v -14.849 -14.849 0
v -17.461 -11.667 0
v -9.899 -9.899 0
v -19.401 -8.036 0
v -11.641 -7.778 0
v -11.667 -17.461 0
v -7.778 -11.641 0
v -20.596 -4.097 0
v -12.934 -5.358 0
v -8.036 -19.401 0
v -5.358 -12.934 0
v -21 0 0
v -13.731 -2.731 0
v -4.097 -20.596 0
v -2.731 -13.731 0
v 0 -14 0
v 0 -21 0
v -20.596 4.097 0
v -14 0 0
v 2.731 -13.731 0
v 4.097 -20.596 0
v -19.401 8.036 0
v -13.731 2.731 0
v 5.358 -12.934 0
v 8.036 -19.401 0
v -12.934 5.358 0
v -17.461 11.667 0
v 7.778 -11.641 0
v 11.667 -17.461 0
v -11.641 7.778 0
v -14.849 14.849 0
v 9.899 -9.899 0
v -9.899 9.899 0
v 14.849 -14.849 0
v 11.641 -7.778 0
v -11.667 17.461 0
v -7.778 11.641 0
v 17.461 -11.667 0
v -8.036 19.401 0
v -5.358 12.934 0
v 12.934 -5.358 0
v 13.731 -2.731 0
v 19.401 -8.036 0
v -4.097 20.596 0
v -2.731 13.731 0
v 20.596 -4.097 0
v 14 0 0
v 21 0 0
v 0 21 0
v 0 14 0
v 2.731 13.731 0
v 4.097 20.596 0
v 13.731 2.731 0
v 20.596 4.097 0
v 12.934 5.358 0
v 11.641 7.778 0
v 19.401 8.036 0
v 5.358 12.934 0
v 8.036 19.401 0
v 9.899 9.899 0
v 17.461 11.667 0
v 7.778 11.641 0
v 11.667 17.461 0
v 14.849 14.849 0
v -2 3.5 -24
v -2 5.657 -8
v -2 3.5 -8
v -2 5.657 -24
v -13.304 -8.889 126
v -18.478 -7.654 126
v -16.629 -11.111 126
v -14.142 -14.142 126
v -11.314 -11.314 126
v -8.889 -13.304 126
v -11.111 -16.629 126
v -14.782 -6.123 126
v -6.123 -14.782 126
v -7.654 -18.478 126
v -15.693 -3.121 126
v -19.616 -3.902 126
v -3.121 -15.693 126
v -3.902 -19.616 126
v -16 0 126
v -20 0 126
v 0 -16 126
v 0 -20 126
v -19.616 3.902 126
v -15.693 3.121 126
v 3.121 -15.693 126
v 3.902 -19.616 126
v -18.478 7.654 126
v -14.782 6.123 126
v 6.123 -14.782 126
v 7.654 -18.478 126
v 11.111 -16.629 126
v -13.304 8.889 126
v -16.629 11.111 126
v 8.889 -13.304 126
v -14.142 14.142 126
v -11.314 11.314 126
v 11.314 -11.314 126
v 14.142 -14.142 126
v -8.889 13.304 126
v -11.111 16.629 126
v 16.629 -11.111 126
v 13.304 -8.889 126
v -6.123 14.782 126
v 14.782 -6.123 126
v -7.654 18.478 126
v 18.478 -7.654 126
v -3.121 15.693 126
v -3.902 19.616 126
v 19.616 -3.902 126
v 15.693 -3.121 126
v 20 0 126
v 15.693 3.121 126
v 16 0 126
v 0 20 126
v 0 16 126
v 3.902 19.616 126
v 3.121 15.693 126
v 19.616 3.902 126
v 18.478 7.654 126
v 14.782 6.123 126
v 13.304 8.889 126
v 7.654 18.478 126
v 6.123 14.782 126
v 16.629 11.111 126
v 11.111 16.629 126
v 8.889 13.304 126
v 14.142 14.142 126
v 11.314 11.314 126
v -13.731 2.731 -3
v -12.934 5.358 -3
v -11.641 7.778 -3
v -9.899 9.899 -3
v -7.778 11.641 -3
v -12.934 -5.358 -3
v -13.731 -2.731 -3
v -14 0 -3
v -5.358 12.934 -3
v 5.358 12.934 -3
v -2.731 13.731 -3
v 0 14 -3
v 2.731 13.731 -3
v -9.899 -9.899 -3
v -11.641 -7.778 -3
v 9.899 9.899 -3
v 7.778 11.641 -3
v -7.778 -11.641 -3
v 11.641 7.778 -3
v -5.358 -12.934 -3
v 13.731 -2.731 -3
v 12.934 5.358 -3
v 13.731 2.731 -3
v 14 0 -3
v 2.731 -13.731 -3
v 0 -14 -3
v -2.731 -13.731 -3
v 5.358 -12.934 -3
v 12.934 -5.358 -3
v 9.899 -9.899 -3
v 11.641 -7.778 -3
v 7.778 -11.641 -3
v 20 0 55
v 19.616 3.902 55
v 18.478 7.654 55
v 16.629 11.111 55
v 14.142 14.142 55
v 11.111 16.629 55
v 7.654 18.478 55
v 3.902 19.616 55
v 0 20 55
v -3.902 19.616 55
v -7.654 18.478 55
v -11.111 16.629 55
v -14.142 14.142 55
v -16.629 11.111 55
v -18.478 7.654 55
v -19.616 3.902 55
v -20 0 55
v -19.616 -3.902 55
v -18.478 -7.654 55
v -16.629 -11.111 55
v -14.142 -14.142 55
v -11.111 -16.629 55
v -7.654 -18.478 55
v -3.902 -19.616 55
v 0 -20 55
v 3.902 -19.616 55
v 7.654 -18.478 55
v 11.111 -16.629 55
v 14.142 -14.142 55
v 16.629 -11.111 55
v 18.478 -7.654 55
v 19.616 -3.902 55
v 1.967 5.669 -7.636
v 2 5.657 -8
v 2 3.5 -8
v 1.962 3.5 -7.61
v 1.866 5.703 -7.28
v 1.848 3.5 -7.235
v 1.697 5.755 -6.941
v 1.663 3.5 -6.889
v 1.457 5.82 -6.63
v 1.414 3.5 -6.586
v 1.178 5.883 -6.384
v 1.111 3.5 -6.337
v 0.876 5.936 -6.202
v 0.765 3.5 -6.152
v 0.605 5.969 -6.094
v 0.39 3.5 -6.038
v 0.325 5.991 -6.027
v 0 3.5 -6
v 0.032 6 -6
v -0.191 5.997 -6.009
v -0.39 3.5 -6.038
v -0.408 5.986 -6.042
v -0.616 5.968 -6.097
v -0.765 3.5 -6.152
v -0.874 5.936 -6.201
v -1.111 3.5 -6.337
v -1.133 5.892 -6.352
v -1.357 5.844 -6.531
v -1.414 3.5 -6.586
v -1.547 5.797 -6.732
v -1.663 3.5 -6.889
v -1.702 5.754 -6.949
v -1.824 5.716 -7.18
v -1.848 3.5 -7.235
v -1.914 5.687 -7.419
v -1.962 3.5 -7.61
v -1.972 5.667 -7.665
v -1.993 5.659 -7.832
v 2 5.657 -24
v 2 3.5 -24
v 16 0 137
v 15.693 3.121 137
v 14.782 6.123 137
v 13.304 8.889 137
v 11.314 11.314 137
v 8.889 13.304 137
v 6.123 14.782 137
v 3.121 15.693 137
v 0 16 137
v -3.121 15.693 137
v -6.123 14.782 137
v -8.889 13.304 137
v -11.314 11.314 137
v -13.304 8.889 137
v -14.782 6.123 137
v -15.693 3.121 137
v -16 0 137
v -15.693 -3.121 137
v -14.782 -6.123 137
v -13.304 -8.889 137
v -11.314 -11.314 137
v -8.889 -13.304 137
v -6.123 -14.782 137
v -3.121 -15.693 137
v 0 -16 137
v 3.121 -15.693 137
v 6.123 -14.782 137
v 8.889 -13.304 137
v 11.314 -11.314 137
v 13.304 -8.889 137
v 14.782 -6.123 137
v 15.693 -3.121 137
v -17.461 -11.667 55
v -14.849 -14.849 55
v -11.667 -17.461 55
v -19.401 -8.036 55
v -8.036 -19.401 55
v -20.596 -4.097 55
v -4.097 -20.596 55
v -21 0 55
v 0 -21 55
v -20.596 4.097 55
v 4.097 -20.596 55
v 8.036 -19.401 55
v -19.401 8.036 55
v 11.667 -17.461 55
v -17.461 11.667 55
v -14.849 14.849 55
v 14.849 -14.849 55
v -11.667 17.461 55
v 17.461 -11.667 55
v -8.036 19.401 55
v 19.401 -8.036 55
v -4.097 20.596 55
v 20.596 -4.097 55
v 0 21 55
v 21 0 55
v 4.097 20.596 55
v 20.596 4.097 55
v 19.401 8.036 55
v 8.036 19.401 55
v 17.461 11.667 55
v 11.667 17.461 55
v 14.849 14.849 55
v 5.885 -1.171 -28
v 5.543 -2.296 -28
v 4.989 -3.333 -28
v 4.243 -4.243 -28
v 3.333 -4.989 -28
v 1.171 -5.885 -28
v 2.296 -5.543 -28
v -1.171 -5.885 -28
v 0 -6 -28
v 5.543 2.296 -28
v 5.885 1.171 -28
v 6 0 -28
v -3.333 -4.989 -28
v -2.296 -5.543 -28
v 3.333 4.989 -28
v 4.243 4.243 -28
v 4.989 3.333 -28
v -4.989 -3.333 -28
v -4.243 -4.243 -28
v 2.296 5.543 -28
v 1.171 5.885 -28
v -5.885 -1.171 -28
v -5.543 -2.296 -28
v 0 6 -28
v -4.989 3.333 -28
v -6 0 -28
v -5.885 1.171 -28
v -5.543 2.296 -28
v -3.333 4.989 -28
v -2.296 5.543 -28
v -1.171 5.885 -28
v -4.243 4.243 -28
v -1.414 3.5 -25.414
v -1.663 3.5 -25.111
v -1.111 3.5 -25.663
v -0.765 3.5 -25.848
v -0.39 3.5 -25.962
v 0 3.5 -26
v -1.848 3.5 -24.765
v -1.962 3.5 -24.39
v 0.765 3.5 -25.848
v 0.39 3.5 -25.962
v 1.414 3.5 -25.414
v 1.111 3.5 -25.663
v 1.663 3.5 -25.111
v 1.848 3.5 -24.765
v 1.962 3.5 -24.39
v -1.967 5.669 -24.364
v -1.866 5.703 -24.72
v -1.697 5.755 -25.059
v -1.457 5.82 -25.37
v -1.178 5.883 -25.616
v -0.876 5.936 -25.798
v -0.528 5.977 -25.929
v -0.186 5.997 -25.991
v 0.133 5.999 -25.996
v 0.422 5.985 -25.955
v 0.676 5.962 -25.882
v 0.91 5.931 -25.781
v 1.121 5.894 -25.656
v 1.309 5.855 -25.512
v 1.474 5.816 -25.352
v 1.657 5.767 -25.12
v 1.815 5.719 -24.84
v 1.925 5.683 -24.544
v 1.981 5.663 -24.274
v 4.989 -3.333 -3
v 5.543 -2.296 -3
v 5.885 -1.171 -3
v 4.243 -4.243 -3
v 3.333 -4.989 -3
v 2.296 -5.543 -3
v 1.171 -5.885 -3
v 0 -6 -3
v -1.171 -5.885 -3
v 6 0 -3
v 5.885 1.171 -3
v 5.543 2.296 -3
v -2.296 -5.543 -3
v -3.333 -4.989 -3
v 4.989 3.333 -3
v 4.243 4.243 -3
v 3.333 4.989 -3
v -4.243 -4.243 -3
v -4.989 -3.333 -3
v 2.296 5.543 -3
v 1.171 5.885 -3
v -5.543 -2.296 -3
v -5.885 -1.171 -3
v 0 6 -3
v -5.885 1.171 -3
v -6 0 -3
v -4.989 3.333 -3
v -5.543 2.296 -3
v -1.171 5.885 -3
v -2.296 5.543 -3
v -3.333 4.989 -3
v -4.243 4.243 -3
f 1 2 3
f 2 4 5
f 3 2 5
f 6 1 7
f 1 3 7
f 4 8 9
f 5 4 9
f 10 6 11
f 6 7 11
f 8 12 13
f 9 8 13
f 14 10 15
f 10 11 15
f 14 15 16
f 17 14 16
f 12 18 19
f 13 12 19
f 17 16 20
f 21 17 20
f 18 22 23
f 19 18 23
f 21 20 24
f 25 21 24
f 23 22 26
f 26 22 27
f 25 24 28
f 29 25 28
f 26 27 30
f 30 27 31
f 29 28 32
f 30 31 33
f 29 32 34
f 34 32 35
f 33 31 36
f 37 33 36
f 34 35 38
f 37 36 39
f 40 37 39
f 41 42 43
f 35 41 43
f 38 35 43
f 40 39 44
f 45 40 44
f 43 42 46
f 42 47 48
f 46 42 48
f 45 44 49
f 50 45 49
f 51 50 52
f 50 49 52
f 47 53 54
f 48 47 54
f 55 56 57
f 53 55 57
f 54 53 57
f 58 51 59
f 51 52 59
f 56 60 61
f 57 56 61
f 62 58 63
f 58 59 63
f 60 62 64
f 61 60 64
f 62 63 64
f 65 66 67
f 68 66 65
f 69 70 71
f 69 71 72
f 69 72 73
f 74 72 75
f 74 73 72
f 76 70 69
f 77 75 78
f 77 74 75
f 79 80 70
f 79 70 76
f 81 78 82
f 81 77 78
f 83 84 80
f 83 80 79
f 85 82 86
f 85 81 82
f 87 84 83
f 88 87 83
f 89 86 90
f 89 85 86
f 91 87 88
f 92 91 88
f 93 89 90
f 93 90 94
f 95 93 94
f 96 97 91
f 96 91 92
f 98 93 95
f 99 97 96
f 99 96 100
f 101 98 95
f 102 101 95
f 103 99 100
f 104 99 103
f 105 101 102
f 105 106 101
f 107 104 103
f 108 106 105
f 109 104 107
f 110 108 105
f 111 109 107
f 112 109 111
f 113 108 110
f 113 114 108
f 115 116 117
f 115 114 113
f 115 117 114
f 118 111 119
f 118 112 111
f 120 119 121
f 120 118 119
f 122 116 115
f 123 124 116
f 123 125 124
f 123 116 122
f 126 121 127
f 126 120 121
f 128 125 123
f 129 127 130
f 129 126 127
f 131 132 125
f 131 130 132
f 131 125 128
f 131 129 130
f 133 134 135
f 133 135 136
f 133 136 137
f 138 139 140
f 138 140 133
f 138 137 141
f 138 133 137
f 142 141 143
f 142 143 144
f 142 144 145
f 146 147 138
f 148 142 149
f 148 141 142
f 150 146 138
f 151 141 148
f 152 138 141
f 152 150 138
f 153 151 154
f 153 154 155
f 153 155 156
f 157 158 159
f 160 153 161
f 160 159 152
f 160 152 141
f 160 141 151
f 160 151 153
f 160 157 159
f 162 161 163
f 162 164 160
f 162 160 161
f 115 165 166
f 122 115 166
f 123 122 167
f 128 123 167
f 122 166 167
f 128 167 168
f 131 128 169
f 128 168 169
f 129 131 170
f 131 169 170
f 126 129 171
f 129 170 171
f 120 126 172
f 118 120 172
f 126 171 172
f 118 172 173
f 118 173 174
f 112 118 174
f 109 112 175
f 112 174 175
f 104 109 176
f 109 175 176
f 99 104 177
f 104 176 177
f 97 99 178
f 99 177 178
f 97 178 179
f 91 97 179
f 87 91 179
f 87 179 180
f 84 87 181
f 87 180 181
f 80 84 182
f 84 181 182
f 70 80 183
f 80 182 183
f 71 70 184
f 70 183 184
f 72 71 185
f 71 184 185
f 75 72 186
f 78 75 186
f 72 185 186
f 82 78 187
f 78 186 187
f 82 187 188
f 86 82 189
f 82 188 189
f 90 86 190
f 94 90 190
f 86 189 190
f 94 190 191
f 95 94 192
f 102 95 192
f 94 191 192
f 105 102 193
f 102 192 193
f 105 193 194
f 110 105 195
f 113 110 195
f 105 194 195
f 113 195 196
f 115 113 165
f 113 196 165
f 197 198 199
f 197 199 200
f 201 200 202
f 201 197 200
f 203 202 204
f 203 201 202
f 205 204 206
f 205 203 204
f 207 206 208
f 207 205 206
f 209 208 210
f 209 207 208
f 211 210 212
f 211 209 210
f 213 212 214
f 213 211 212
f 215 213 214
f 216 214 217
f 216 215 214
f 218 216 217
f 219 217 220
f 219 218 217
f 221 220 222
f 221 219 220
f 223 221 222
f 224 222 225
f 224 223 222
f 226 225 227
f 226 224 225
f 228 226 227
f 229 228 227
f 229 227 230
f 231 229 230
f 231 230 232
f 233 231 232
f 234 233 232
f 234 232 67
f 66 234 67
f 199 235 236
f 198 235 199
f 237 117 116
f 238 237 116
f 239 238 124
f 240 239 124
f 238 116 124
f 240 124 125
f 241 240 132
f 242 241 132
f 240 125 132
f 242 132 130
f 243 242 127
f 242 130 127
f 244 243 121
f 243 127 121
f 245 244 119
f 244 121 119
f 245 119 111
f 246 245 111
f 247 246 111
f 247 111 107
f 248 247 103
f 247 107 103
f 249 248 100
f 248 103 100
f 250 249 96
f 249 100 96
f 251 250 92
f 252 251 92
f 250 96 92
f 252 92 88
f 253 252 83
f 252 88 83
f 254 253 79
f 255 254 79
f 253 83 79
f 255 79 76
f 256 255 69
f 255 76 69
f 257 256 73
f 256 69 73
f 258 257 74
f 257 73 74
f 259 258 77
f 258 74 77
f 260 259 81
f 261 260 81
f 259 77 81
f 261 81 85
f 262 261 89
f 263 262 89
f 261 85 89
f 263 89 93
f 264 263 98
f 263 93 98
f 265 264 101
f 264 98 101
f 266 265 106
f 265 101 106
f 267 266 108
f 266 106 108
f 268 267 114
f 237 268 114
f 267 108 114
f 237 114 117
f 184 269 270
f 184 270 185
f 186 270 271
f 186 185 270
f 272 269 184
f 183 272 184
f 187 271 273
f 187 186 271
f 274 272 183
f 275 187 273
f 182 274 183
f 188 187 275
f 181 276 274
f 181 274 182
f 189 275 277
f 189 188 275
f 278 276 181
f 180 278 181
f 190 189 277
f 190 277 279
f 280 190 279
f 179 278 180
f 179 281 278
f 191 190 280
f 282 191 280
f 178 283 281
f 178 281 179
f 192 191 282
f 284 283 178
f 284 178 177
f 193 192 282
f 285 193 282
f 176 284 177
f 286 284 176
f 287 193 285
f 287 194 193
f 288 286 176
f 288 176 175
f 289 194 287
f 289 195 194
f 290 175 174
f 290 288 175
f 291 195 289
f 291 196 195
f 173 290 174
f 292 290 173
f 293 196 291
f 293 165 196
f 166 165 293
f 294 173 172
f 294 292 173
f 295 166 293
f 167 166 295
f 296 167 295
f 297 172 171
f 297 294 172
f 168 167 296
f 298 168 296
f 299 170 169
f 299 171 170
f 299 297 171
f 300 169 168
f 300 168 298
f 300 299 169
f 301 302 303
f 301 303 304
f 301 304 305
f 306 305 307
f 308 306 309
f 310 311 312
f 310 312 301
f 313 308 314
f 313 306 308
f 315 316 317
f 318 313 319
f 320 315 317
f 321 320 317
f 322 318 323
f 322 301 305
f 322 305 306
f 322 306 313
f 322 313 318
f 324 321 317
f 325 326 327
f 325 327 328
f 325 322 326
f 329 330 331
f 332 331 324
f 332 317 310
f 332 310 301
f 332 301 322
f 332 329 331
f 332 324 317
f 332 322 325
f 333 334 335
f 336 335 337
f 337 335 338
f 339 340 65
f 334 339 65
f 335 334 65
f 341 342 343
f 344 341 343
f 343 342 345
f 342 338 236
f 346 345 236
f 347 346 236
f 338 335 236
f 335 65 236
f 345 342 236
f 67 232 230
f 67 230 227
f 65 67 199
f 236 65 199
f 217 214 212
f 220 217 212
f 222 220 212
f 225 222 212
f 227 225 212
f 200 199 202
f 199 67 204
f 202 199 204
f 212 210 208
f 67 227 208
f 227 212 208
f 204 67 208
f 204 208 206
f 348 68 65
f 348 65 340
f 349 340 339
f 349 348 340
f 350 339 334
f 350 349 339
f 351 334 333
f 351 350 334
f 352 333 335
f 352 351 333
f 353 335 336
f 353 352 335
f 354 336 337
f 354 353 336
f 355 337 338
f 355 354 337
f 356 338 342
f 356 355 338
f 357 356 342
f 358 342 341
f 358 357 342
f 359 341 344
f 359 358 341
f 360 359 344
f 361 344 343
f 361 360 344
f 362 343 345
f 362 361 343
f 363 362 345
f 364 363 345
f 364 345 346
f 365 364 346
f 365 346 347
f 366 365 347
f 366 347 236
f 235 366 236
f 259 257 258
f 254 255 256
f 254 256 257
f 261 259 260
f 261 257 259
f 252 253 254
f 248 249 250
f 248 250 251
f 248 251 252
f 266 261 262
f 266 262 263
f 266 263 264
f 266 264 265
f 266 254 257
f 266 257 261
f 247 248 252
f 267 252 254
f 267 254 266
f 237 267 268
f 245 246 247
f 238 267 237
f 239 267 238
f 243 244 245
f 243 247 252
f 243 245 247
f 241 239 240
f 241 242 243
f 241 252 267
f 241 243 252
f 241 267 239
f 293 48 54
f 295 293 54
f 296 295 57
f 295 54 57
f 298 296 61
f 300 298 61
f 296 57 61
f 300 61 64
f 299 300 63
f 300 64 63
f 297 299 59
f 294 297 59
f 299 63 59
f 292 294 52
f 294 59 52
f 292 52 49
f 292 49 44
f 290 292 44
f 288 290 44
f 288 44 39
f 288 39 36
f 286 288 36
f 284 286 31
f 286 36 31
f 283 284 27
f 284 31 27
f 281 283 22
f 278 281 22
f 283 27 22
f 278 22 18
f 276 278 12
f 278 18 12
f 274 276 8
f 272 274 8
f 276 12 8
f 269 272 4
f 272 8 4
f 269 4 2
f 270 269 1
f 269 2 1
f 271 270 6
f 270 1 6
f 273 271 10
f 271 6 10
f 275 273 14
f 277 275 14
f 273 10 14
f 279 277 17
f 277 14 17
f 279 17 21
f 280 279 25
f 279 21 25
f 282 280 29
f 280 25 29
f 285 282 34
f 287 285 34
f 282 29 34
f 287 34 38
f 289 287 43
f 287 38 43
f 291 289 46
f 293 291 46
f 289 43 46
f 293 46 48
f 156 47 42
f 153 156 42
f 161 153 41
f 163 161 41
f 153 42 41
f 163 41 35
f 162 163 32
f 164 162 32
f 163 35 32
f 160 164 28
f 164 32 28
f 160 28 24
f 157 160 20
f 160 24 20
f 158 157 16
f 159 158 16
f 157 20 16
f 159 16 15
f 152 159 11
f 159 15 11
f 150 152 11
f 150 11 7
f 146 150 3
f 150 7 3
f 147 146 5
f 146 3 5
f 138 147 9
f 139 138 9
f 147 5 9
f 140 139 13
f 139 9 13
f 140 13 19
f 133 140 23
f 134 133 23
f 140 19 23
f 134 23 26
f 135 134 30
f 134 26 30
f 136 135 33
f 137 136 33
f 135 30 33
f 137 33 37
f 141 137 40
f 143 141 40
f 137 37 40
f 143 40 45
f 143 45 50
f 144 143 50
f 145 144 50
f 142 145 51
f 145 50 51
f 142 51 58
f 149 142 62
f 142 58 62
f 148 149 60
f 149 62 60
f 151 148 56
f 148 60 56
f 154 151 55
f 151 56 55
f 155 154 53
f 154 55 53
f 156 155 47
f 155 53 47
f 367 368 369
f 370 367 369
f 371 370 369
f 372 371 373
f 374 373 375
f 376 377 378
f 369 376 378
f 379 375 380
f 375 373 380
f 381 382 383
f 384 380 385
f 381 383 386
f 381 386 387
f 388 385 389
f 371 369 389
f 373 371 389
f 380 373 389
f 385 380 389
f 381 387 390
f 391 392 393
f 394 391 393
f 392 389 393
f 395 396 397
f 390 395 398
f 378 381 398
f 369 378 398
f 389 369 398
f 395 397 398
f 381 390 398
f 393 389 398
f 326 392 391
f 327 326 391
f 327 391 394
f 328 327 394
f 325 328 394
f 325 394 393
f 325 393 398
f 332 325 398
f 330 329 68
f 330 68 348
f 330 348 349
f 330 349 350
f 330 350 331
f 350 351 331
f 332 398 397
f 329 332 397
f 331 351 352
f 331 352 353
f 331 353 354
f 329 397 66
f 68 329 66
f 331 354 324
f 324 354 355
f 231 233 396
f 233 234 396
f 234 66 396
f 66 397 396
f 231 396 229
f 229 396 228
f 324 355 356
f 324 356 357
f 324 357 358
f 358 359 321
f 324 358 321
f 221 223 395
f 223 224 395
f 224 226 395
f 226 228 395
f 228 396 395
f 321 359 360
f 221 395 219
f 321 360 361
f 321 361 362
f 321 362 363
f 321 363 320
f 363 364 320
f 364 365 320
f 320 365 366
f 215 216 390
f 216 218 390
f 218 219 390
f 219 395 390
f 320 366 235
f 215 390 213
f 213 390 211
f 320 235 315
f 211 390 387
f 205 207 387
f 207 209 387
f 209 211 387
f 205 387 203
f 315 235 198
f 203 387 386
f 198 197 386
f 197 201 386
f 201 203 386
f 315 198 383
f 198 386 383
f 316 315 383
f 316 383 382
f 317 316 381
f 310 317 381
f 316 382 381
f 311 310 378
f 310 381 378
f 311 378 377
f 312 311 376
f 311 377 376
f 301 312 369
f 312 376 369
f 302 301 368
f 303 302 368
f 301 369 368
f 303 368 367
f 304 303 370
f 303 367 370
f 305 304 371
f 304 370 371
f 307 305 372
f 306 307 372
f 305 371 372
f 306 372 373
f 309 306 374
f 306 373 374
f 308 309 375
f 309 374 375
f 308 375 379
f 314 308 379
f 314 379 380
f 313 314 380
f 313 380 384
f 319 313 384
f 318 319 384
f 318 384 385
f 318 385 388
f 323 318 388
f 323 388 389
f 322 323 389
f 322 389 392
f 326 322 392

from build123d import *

# Parameters (mm, degrees)
SKETCH_1_R          = 21
EXTRUDE_323_DEPTH   = 55
SKETCH_2_R          = 20
EXTRUDE_422_DEPTH   = 71
SKETCH_3_R          = 16
EXTRUDE_545_DEPTH   = 11
SKETCH_5_R          = 14
EXTRUDE_640_DEPTH   = 3
SKETCH_4_R          = 6
EXTRUDE_761_DEPTH   = 25
CUT_EXTRUDE_1_DEPTH = 2.5


with BuildPart() as part:
    # 草图1 → Extrude 323 (new body)
    with BuildSketch(Plane.XY):
        Circle(SKETCH_1_R)
    extrude(amount=EXTRUDE_323_DEPTH)

    # 草图2 → Extrude 422 (add)
    with BuildSketch(Plane.XY.offset(55)):
        Circle(SKETCH_2_R)
    extrude(amount=EXTRUDE_422_DEPTH)

    # 草图3 → Extrude 545 (add)
    with BuildSketch(Plane.XY.offset(126)):
        Circle(SKETCH_3_R)
    extrude(amount=EXTRUDE_545_DEPTH)

    # 草图5 → Extrude 640 (add)
    with BuildSketch(Plane(origin=(0, 0, 0), x_dir=(-1, 0, 0), z_dir=(0, 0, -1))):
        with Locations(Location((0, 0, 0), (0, 0, 180))):
            Circle(SKETCH_5_R)
    extrude(amount=EXTRUDE_640_DEPTH)


with BuildPart() as body_2:
    # 草图4 → Extrude 761 (new body)
    with BuildSketch(Plane(origin=(0, 0, -3), x_dir=(-1, 0, 0), z_dir=(0, 0, -1))):
        Circle(SKETCH_4_R)
    extrude(amount=EXTRUDE_761_DEPTH)

    # 草图6 → 切除-拉伸1 (cut)
    with BuildSketch(Plane(origin=(0, 6, 0), x_dir=(-1, 0, 0), z_dir=(0, 1, 0))):
        with BuildLine():
            Line((-2, -24), (-2, -8))
            ThreePointArc((-2, -8), (0, -6), (2, -8))
            Line((2, -8), (2, -24))
            ThreePointArc((2, -24), (0, -26), (-2, -24))
        make_face()
    extrude(amount=-CUT_EXTRUDE_1_DEPTH, mode=Mode.SUBTRACT)


solid = Compound([part.part, body_2.part])
